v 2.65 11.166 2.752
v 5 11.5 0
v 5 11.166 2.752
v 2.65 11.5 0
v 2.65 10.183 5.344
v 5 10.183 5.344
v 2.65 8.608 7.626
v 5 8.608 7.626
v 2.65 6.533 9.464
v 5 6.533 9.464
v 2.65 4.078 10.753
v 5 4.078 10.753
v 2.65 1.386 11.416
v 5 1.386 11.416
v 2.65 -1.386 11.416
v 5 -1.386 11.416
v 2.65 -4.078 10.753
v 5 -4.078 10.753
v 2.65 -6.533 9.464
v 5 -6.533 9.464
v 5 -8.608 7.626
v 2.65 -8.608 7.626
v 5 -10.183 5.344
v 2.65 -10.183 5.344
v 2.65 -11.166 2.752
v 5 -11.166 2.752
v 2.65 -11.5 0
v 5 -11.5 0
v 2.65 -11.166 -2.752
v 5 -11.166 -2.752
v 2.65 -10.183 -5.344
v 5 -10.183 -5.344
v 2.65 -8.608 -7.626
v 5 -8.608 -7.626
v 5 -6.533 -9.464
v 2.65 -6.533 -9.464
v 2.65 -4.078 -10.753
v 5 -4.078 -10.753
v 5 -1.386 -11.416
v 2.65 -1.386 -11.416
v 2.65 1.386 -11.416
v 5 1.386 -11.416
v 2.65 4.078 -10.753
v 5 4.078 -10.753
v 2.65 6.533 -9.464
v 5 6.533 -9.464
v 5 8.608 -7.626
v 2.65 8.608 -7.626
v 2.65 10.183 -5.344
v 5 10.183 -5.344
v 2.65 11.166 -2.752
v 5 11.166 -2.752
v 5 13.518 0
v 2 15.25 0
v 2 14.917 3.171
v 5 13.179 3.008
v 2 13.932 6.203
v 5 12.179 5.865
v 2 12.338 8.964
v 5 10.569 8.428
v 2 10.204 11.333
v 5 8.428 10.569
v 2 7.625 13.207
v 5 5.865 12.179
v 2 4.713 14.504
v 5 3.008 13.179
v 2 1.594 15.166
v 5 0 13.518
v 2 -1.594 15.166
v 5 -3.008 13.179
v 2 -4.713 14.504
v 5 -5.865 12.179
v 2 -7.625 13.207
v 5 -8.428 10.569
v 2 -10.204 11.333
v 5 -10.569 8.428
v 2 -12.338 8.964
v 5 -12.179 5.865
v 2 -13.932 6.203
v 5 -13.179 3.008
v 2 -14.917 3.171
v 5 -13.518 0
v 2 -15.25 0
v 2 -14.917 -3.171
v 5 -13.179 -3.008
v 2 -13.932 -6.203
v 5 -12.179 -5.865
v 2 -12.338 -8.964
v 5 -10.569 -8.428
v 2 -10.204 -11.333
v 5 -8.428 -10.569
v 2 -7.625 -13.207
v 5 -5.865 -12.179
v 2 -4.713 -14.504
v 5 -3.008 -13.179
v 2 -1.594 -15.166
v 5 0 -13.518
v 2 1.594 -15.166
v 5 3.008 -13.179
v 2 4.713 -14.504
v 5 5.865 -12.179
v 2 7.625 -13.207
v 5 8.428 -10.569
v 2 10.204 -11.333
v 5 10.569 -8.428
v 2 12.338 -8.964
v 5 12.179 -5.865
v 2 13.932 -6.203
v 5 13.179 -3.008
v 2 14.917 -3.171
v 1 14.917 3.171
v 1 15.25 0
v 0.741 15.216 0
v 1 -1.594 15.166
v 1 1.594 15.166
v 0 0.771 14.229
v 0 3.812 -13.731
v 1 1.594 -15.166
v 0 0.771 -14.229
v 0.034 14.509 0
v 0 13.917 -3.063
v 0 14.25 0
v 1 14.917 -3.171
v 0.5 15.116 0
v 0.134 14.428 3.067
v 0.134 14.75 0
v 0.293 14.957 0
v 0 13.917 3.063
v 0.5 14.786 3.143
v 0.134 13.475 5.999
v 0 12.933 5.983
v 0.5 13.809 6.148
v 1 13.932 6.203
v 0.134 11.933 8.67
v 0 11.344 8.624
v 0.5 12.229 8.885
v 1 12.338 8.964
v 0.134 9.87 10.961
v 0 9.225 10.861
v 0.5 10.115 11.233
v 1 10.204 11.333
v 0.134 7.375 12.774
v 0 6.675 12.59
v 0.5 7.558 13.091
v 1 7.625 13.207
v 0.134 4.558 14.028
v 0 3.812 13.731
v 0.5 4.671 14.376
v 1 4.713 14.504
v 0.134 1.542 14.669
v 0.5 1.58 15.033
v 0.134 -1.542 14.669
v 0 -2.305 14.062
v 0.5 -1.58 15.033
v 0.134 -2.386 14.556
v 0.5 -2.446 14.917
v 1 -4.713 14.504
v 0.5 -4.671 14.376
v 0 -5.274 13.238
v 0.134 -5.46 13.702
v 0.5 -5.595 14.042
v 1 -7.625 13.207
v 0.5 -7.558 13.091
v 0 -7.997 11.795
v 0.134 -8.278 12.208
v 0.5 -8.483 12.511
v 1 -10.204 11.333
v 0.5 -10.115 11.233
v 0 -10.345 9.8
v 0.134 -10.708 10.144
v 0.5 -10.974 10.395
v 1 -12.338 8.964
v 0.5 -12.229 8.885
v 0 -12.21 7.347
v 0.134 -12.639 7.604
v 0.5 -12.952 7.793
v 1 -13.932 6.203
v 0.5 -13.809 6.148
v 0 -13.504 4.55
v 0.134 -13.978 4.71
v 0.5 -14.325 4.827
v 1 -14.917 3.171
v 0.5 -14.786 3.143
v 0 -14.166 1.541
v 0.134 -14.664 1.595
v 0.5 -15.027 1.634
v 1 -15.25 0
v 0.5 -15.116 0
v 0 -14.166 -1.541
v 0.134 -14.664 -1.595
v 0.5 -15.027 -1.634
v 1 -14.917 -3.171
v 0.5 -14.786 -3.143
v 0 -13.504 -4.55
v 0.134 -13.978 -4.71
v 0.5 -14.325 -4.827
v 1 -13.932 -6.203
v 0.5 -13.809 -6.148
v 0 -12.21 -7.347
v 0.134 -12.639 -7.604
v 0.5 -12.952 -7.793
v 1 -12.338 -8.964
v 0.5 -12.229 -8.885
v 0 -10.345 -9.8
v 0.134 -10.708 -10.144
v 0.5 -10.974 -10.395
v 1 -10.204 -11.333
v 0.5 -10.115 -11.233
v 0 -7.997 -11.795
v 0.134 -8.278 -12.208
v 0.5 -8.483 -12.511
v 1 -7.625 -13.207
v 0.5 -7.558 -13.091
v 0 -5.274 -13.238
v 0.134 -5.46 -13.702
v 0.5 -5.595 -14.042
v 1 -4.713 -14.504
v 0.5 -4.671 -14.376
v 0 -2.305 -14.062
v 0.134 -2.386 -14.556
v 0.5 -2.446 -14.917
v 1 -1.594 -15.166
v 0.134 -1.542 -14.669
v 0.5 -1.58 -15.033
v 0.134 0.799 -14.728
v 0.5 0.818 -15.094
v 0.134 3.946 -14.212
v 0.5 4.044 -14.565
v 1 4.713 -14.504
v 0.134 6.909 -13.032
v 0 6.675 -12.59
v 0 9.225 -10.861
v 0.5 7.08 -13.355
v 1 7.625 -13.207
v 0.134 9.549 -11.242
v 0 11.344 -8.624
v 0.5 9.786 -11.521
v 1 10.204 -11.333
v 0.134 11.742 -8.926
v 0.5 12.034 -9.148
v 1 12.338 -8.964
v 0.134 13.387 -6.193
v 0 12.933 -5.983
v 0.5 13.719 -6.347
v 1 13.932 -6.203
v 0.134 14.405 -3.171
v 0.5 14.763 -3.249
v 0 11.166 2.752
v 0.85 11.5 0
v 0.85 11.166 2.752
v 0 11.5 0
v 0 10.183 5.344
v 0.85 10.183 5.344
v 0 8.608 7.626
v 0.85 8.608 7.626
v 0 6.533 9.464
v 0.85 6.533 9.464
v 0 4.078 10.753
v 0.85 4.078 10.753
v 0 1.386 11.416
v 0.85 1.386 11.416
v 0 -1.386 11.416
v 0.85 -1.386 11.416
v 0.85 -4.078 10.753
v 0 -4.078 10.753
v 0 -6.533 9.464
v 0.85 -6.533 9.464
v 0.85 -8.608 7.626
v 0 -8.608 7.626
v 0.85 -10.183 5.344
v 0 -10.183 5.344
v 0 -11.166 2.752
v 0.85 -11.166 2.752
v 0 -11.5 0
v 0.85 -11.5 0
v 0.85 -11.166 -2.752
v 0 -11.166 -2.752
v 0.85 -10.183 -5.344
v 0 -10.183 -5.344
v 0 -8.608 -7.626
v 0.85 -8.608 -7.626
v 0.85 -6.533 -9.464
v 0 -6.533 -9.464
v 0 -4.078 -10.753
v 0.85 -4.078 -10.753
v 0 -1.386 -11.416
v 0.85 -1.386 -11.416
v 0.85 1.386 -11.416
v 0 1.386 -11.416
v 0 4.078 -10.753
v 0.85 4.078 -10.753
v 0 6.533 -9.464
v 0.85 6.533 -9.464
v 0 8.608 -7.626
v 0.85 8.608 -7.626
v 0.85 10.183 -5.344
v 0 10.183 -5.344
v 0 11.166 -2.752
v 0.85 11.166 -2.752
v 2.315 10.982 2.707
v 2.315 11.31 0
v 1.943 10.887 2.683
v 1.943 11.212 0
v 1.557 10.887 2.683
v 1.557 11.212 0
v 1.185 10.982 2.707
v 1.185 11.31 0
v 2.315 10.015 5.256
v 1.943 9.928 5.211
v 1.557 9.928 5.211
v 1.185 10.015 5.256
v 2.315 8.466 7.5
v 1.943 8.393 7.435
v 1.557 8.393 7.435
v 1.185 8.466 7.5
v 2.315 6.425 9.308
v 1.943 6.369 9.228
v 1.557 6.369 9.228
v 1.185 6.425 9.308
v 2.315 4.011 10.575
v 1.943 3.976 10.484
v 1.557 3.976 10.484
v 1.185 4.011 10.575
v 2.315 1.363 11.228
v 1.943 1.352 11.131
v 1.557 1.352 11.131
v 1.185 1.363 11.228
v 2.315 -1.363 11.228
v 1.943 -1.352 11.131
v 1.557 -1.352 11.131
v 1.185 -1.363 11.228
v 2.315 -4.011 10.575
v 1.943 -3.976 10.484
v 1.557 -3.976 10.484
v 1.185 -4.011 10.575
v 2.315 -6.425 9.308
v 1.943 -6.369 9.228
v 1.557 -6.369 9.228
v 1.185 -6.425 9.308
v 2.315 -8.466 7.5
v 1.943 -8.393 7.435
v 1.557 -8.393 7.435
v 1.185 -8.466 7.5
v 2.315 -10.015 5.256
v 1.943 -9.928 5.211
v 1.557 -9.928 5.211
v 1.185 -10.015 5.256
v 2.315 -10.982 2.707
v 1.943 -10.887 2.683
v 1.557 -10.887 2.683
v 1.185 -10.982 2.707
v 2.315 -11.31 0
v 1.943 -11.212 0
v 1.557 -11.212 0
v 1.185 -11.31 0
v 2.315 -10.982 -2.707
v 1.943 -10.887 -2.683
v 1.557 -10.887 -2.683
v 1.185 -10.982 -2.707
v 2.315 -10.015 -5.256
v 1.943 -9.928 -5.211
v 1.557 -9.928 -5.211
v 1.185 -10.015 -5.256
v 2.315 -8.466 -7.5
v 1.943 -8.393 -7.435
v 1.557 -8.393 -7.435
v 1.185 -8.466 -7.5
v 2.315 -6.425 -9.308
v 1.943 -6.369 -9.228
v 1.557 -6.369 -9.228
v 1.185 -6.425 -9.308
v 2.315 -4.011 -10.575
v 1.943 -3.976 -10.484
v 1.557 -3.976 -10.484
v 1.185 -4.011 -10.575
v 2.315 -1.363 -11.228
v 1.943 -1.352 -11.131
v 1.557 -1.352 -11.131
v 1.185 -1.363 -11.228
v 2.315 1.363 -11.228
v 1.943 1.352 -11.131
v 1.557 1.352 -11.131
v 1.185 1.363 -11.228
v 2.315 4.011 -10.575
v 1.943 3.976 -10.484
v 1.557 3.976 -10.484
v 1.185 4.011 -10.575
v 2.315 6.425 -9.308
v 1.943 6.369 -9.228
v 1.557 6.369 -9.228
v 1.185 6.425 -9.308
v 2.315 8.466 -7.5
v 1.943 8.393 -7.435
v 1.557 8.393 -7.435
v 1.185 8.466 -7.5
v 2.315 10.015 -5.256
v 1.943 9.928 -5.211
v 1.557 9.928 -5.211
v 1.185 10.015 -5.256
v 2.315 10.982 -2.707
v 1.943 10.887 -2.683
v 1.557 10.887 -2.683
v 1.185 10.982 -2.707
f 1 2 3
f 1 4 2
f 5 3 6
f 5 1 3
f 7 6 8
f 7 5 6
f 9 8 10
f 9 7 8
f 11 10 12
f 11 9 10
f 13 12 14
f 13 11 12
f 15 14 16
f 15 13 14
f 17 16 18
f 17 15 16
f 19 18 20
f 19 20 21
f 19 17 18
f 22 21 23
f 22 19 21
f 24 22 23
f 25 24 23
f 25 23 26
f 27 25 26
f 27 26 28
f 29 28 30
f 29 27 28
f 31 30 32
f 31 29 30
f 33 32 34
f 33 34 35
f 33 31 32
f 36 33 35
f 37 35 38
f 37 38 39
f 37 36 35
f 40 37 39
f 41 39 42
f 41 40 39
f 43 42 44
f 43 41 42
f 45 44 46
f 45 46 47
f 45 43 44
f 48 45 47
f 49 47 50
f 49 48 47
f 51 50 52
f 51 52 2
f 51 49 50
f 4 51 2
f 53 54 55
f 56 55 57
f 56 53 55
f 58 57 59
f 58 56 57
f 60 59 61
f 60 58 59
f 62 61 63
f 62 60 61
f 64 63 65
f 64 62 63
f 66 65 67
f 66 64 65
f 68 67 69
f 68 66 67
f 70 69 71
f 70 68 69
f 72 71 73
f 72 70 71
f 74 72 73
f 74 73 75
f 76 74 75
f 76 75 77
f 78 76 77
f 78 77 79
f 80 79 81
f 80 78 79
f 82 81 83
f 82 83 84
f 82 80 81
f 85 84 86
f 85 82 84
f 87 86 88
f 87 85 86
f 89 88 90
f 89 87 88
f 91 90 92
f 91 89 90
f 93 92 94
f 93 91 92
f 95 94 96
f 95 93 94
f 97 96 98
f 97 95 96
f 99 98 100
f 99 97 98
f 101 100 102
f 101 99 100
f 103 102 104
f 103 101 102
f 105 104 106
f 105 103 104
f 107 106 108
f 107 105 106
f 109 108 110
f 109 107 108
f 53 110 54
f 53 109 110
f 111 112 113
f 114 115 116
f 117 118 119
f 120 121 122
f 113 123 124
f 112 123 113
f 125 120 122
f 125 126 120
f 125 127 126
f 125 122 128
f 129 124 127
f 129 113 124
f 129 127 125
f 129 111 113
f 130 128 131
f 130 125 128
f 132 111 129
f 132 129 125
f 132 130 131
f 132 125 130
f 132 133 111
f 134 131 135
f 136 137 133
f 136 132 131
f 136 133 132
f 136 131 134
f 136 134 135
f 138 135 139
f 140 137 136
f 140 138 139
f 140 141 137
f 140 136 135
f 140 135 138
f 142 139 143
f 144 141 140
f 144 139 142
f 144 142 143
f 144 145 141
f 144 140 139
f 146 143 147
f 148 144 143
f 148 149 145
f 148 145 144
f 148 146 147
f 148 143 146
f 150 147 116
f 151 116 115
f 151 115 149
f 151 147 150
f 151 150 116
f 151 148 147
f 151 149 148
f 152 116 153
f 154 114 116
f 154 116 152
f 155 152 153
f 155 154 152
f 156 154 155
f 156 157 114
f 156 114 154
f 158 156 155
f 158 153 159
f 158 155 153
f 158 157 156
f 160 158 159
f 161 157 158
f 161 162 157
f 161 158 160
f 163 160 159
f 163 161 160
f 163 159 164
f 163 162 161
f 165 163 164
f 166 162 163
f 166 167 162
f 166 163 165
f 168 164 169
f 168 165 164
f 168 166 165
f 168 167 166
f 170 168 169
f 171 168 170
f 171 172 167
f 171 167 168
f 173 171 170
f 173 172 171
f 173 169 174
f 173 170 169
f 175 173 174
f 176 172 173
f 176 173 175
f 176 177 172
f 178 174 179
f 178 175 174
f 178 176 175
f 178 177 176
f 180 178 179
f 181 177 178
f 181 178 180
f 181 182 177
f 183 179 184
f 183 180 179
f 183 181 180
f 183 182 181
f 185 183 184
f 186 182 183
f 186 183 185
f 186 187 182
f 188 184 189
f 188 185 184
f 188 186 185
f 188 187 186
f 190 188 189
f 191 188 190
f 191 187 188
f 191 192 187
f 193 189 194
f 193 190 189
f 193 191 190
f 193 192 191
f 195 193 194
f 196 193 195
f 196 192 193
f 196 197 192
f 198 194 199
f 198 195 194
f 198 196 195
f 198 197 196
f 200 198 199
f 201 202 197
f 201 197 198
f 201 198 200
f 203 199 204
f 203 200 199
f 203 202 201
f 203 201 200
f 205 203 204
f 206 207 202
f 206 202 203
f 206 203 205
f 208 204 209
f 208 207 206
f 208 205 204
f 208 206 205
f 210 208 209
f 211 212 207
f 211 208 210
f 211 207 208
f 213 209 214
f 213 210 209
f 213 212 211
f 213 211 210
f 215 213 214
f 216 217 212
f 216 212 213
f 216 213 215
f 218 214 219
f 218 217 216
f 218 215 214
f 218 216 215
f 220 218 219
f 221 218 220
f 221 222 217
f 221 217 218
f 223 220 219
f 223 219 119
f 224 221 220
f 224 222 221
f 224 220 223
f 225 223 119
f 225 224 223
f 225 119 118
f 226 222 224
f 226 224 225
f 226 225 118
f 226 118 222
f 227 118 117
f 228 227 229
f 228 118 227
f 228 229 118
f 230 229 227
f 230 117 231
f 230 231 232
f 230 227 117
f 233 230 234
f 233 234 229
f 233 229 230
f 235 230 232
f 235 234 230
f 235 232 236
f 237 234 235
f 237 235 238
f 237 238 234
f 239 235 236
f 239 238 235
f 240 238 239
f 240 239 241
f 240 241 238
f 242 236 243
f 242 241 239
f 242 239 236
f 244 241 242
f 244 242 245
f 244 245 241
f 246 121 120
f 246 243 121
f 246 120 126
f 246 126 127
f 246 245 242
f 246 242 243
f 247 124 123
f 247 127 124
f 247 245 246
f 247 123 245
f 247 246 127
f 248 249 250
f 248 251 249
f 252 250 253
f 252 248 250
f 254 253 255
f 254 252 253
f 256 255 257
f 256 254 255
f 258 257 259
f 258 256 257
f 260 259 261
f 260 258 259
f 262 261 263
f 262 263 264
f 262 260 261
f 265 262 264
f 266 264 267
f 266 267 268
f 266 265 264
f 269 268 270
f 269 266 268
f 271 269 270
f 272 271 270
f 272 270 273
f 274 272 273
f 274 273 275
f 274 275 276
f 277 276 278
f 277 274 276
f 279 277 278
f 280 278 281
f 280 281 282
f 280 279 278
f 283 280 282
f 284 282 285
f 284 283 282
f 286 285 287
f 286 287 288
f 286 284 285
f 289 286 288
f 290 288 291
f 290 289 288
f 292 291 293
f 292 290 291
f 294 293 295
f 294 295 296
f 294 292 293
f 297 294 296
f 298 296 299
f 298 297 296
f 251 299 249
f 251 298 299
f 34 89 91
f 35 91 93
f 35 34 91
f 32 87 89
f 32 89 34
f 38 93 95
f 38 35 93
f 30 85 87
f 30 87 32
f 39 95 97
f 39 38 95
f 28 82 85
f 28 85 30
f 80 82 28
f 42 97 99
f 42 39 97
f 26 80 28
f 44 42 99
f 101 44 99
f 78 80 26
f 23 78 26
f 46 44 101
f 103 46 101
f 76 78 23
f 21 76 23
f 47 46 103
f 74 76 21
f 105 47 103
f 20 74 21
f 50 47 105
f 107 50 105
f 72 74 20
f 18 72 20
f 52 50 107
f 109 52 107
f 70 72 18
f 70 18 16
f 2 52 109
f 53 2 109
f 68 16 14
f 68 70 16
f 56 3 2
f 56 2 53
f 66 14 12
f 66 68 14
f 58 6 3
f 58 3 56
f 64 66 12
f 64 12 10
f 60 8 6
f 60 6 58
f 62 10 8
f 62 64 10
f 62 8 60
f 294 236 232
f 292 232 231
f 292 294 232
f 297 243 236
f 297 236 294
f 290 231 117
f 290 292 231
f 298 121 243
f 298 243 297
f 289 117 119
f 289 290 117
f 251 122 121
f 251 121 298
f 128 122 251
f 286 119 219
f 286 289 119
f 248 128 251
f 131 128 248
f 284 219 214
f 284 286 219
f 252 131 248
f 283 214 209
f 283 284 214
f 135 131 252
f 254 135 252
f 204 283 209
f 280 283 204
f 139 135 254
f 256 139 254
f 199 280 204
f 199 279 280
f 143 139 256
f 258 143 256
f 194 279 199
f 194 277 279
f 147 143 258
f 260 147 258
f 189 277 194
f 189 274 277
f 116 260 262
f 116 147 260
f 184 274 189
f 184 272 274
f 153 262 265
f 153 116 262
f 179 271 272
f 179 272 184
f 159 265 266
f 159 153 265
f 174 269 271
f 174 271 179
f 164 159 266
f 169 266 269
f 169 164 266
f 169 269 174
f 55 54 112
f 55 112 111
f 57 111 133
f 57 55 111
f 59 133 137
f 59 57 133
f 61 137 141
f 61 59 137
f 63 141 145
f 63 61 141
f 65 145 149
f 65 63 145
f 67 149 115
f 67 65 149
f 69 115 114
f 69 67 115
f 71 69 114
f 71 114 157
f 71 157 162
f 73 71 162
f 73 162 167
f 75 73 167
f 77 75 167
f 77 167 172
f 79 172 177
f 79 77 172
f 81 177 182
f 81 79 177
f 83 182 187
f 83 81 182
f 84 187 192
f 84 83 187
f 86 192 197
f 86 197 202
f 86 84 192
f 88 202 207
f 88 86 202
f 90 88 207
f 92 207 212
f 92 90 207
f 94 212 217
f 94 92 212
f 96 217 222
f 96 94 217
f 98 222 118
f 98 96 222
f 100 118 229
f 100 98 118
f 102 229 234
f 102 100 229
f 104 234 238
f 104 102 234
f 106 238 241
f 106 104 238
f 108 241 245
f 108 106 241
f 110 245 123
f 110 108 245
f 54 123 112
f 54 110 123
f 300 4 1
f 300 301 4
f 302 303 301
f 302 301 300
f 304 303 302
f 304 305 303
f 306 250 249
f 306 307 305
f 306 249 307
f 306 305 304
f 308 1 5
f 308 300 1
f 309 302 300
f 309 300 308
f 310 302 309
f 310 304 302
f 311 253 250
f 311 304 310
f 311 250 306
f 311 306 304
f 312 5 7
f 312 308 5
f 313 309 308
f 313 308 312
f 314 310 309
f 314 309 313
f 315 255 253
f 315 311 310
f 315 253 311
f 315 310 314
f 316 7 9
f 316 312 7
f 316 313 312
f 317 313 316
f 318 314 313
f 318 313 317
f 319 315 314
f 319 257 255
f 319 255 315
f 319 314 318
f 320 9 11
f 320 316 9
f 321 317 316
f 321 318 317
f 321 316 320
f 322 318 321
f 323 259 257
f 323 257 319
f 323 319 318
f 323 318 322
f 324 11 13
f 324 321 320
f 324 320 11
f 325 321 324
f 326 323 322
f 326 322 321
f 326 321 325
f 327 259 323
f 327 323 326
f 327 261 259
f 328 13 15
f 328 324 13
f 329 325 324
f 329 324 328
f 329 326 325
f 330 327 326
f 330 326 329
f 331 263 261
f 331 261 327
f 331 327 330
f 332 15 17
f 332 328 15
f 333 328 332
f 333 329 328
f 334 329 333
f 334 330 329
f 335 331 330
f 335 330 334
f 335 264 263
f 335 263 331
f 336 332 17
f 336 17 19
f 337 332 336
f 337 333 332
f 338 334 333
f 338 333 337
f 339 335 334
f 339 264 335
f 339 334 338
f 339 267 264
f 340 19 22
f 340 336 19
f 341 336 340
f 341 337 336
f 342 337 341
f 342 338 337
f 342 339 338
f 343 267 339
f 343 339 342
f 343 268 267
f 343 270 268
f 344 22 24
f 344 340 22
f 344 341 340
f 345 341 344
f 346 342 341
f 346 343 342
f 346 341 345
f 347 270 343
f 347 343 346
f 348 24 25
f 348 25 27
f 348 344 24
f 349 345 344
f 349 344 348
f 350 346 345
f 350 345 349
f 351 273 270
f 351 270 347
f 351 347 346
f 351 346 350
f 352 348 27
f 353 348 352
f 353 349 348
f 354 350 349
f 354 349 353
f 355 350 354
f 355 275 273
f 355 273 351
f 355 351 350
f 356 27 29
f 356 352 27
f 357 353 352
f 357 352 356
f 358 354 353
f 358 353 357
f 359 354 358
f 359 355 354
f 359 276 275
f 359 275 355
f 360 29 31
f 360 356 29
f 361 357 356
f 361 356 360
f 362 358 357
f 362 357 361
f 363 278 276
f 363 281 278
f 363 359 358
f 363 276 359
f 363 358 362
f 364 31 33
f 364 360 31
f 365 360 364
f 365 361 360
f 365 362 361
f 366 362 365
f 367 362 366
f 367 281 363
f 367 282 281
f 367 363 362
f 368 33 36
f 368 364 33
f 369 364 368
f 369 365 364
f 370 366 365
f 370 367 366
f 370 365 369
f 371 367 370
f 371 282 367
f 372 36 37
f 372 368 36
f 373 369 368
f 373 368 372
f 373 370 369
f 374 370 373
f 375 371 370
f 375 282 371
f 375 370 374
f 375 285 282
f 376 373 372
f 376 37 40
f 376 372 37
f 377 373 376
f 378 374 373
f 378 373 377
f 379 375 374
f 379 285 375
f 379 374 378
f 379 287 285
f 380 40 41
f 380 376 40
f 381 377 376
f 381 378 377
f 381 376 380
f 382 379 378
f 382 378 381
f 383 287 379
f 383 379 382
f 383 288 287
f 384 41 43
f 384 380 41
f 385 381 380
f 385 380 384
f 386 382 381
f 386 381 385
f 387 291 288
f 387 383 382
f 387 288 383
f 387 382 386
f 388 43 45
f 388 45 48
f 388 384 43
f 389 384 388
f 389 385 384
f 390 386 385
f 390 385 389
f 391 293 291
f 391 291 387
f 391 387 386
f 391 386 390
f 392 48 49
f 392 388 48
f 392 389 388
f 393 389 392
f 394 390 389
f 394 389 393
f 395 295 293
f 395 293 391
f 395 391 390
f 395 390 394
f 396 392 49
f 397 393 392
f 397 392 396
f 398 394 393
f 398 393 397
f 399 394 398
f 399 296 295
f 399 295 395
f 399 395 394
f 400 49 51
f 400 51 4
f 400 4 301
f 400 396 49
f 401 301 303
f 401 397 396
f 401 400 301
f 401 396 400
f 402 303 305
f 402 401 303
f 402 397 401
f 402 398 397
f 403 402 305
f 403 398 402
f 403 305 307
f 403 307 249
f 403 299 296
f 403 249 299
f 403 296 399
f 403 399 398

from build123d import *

# Parameters (mm, degrees)
FILLET1_R = 1


with BuildPart() as part:
    # Sketch1 → Revolve1 (revolve)
    with BuildSketch(Plane.XY):
        with BuildLine():
            Line((0, 11.5), (0, 15.25))
            Line((0, 15.25), (2, 15.25))
            Line((2, 15.25), (5, 13.517949192))
            Line((5, 13.517949192), (5, 11.5))
            Line((5, 11.5), (2.65, 11.5))
            ThreePointArc((2.65, 11.5), (1.75, 11.2), (0.85, 11.5))
            Line((0.85, 11.5), (0, 11.5))
        make_face()
    revolve(axis=Axis((0, 0, 0), (1, 0, 0)))

    # Fillet1
    fillet1_edges = [part.edges().sort_by_distance(p)[0] for p in [
        (0, -15.25, 0),
    ]]
    fillet(fillet1_edges, radius=FILLET1_R)


solid = part.part
